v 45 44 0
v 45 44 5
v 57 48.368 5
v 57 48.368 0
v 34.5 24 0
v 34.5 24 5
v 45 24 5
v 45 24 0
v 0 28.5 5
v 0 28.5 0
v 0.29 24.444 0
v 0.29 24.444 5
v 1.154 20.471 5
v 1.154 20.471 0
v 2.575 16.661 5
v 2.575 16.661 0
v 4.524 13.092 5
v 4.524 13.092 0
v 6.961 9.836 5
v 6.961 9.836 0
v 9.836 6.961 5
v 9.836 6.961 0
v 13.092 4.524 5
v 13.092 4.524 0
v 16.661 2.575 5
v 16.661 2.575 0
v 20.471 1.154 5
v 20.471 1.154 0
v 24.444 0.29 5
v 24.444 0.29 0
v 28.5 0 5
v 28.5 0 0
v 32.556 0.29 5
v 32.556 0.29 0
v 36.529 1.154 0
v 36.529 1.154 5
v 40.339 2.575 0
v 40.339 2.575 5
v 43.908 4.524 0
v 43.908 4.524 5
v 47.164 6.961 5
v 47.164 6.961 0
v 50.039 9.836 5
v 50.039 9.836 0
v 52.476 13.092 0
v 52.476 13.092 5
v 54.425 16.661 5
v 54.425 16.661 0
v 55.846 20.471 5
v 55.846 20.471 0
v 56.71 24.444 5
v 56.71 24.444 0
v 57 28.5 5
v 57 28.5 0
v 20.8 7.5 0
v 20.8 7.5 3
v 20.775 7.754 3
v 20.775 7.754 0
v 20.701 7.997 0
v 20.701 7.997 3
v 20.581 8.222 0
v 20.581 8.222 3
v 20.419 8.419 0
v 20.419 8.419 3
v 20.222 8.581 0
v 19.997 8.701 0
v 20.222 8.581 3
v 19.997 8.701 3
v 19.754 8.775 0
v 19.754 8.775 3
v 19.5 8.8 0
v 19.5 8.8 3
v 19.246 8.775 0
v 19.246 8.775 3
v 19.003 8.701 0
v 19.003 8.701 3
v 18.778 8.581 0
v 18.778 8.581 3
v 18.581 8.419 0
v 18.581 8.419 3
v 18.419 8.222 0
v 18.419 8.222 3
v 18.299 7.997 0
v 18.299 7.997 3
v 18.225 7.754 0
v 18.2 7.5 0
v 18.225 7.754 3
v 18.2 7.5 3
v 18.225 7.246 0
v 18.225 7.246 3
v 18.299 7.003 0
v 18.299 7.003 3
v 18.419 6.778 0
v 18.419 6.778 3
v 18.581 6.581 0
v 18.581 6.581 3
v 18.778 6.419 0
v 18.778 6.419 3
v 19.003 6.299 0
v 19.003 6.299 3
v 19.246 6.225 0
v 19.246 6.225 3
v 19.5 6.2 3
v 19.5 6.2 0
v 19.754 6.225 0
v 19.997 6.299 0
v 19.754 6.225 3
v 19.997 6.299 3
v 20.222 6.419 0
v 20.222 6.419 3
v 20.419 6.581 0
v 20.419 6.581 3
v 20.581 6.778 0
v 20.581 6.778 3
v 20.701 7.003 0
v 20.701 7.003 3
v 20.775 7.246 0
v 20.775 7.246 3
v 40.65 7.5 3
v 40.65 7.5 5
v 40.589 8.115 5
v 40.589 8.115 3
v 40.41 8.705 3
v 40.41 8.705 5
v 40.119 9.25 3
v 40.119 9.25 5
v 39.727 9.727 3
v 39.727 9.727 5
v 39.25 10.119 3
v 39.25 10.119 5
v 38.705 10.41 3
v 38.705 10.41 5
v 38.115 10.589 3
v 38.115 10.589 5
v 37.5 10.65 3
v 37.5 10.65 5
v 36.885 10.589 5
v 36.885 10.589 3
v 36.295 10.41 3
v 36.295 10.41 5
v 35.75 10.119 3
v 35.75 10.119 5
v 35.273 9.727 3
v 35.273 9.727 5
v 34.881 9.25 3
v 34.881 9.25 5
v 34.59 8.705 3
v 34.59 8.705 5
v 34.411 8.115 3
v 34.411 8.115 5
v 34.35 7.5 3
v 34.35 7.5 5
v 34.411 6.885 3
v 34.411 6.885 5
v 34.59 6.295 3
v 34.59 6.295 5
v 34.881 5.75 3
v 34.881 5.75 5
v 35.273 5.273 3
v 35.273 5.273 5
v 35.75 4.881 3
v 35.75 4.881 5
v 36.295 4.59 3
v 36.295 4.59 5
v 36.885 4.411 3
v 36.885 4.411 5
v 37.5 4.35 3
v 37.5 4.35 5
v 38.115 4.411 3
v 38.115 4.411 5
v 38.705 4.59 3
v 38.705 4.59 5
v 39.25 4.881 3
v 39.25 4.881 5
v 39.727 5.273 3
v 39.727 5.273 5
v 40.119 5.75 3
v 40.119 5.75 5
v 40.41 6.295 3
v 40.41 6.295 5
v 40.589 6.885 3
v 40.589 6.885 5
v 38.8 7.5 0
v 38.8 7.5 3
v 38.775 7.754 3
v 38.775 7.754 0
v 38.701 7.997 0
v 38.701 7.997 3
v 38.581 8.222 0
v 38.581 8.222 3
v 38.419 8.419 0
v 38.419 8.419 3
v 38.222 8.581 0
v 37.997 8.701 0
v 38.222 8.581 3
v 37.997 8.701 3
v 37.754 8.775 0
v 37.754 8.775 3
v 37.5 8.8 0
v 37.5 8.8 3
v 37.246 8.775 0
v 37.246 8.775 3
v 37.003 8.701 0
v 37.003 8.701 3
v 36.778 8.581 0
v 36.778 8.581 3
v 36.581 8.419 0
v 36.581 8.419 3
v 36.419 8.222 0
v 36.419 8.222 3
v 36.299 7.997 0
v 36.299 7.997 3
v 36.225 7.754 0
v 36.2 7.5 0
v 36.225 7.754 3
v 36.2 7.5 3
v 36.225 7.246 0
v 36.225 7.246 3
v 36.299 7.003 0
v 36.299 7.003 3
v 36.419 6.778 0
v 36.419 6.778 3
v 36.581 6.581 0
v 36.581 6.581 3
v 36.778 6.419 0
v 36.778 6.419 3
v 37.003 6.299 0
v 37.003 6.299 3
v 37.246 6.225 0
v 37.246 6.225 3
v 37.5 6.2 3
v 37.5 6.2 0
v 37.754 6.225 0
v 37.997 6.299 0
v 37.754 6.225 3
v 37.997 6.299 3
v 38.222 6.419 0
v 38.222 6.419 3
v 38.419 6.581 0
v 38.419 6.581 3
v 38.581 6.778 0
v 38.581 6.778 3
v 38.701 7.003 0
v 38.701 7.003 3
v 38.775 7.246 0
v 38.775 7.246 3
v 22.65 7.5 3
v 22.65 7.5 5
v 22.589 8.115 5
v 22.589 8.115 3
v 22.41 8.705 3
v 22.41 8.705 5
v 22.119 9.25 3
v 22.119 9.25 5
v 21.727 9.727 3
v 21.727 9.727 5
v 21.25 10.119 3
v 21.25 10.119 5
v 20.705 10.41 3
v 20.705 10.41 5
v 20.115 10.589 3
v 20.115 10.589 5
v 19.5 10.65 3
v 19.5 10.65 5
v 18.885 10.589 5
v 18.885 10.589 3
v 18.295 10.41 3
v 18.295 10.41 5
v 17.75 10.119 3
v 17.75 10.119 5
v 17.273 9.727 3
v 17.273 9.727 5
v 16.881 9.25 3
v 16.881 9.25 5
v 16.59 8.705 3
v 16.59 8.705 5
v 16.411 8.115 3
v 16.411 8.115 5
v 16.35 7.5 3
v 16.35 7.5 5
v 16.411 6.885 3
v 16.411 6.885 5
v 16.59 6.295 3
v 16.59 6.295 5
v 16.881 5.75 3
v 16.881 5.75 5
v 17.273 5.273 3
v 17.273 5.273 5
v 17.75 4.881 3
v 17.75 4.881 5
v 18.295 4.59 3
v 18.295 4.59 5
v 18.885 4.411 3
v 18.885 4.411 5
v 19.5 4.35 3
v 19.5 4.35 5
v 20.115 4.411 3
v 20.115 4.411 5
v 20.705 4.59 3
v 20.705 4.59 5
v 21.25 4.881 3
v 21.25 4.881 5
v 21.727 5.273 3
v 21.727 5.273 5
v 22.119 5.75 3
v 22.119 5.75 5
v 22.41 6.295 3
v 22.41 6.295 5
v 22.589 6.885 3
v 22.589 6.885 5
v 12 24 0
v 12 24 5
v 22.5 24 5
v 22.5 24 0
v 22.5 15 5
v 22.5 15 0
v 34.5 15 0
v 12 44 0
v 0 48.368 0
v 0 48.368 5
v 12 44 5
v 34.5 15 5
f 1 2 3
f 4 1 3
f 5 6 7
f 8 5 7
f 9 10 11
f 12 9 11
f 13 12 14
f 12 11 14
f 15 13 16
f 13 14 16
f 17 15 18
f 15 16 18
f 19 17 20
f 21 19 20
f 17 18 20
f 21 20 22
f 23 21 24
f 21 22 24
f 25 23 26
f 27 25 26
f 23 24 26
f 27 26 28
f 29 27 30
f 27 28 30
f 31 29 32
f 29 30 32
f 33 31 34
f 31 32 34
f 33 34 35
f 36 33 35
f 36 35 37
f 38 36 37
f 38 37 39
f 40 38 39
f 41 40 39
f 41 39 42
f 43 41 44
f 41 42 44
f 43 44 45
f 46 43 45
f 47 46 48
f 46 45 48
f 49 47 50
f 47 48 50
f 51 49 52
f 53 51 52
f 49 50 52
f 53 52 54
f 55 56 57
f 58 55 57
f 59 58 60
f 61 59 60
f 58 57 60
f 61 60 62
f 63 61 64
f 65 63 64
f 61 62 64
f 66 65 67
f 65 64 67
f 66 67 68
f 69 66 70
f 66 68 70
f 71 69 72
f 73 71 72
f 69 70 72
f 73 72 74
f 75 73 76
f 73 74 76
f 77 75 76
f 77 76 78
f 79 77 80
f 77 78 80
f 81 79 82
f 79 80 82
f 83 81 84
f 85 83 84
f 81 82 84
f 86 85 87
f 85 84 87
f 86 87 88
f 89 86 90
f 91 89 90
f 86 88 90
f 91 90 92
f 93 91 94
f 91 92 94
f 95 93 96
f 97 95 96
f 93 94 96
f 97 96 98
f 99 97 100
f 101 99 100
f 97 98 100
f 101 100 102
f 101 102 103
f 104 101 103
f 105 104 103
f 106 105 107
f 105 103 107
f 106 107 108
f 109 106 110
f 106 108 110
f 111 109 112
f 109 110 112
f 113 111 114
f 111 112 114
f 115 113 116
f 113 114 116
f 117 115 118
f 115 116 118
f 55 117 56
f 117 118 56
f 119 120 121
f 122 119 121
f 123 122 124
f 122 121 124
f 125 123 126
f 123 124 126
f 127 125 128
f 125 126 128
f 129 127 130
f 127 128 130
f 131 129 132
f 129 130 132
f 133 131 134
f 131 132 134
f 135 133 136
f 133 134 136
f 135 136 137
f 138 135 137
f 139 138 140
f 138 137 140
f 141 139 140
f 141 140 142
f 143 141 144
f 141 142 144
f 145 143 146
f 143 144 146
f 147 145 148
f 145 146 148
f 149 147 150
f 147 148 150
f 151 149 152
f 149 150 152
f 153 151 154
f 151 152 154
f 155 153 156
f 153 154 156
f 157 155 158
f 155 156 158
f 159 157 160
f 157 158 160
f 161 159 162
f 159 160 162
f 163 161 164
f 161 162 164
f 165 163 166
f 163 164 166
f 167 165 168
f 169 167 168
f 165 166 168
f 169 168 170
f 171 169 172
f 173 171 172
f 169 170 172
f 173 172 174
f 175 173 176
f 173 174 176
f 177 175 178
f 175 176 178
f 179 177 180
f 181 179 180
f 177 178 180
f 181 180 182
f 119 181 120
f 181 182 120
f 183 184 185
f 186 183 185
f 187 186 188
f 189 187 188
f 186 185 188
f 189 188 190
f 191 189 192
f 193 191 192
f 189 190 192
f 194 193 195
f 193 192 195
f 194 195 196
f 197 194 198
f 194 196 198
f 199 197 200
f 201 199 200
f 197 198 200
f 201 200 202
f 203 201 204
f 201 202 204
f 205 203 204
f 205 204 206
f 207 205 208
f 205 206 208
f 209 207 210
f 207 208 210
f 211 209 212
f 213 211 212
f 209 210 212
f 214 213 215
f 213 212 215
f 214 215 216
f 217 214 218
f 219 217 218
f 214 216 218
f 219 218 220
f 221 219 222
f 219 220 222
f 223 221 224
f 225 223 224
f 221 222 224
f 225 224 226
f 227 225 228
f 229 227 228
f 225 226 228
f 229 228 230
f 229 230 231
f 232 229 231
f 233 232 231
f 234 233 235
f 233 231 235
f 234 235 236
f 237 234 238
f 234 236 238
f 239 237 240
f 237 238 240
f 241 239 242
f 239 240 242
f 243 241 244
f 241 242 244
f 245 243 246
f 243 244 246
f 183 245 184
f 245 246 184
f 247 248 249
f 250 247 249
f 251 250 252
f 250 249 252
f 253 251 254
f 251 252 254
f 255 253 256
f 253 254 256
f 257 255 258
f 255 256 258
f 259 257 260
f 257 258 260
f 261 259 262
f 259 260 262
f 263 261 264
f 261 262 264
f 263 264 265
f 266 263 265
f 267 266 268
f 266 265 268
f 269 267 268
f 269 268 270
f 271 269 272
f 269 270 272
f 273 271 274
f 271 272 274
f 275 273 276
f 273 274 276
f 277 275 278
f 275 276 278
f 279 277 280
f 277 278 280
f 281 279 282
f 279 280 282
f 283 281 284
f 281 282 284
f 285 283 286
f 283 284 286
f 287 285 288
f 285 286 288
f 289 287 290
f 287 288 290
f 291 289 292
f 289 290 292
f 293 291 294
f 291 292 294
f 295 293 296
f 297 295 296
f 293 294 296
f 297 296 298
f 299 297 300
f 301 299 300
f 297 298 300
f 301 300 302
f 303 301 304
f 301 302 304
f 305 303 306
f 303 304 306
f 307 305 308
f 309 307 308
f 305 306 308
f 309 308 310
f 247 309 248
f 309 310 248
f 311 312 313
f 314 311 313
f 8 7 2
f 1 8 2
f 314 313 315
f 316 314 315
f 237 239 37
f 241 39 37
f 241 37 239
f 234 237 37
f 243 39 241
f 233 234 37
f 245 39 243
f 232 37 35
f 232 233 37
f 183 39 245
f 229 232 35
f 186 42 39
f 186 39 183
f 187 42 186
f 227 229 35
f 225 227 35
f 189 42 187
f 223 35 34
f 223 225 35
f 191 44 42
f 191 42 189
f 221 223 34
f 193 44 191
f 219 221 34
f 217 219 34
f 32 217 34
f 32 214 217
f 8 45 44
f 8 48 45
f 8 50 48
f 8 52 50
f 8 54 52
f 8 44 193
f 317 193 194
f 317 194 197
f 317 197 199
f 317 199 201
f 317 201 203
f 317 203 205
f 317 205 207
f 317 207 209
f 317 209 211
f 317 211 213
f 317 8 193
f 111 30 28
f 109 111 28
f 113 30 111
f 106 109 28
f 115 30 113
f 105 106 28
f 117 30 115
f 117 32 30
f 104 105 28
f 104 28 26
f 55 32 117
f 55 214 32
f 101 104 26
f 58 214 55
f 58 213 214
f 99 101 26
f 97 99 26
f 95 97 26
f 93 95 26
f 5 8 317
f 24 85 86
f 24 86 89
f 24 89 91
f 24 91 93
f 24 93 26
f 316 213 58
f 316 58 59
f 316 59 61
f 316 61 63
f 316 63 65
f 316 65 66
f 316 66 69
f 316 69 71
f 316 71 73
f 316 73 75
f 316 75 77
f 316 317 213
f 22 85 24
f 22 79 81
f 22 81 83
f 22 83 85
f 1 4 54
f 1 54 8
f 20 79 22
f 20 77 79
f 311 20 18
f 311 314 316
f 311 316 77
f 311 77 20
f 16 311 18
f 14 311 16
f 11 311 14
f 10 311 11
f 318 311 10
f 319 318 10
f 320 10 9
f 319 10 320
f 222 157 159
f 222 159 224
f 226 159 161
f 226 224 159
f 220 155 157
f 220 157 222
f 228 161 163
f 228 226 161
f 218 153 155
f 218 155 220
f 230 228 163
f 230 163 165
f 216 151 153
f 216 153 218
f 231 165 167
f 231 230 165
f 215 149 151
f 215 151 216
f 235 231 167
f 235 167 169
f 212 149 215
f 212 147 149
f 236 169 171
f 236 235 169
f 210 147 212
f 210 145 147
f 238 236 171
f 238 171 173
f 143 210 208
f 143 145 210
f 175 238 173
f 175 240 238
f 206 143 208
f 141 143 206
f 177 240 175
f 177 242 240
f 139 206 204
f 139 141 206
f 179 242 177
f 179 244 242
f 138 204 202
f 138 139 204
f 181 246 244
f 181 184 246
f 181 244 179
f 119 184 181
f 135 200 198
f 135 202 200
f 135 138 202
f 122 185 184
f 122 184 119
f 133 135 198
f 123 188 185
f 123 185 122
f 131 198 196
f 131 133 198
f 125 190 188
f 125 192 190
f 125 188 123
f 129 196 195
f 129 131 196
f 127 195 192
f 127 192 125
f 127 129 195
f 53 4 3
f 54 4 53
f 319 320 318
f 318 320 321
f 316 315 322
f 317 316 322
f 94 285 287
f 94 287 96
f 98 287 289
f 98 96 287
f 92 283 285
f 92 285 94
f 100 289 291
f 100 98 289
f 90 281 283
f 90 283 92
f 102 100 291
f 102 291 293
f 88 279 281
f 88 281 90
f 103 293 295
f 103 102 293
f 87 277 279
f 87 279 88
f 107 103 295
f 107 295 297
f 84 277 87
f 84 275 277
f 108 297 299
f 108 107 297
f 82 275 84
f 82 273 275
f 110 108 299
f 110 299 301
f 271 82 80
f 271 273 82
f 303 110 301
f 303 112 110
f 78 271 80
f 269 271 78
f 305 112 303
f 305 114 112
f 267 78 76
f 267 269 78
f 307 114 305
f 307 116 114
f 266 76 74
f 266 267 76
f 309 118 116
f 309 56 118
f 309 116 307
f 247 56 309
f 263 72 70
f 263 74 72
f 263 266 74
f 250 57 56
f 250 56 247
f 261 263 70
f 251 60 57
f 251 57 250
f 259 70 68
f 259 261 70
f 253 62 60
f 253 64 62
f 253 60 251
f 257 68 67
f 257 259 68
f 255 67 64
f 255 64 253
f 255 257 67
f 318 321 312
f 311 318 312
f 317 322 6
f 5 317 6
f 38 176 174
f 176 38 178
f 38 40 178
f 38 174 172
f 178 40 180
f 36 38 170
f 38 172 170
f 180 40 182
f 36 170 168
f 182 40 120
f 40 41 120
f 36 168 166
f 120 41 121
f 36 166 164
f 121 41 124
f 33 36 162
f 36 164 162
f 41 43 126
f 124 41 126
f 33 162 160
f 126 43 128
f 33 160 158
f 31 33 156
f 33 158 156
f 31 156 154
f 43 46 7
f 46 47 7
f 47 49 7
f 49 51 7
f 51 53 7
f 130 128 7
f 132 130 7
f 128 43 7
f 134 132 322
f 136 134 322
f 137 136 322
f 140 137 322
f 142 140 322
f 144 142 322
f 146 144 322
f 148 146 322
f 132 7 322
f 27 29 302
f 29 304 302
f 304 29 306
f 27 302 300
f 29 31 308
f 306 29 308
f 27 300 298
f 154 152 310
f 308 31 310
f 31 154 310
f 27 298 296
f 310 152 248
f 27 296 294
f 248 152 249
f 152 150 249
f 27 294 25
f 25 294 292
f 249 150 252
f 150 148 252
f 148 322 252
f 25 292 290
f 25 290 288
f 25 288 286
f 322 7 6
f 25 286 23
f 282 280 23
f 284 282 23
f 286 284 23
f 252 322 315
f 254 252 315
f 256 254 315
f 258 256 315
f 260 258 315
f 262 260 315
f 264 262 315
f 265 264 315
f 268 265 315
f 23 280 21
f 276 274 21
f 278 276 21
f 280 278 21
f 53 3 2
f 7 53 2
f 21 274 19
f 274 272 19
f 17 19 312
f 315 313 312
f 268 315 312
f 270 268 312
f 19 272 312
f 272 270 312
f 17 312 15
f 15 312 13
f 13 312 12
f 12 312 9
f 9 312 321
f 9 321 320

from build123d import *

# Parameters (mm, degrees)
PAD007_DEPTH    = 5
POCKET016_DEPTH = 5
SKETCH028_R     = 3.15
POCKET_DEPTH    = 2
SKETCH041_R     = 1.3
POCKET024_DEPTH = 3


with BuildPart() as part:
    # Sketch025 → Pad007 (new body)
    with BuildSketch(Plane.XY):
        with BuildLine():
            Line((0, 28.5), (0, 57))
            Line((0, 57), (57, 57))
            Line((57, 57), (57, 28.5))
            ThreePointArc((0, 28.5), (28.5, 0), (57, 28.5))
        make_face()
    extrude(amount=PAD007_DEPTH)

    # Sketch026 (on Face6 of Pad007) → Pocket016 (cut)
    with BuildSketch(Plane.XY.offset(5)):
        Polygon((22.5, 15), (34.5, 15), (34.5, 24), (45, 24), (45, 44), (80.717206, 57), (45, 57), (12, 57), (-23.717206, 57), (12, 44), (12, 24), (22.5, 24), align=None)
    extrude(amount=-POCKET016_DEPTH, mode=Mode.SUBTRACT)

    # Sketch028 (on Face4 of Pocket016) → Pocket (cut)
    with BuildSketch(Plane.XY.offset(5)):
        with Locations((19.5, 7.5)):
            Circle(SKETCH028_R)
        with Locations((37.5, 7.5)):
            Circle(SKETCH028_R)
    extrude(amount=-POCKET_DEPTH, mode=Mode.SUBTRACT)

    # Sketch041 (on Face18 of Pocket) → Pocket024 (cut)
    with BuildSketch(Plane.XY.offset(3)):
        with Locations((19.5, 7.5)):
            Circle(SKETCH041_R)
        with Locations((37.5, 7.5)):
            Circle(SKETCH041_R)
    extrude(amount=-POCKET024_DEPTH, mode=Mode.SUBTRACT)


solid = part.part
